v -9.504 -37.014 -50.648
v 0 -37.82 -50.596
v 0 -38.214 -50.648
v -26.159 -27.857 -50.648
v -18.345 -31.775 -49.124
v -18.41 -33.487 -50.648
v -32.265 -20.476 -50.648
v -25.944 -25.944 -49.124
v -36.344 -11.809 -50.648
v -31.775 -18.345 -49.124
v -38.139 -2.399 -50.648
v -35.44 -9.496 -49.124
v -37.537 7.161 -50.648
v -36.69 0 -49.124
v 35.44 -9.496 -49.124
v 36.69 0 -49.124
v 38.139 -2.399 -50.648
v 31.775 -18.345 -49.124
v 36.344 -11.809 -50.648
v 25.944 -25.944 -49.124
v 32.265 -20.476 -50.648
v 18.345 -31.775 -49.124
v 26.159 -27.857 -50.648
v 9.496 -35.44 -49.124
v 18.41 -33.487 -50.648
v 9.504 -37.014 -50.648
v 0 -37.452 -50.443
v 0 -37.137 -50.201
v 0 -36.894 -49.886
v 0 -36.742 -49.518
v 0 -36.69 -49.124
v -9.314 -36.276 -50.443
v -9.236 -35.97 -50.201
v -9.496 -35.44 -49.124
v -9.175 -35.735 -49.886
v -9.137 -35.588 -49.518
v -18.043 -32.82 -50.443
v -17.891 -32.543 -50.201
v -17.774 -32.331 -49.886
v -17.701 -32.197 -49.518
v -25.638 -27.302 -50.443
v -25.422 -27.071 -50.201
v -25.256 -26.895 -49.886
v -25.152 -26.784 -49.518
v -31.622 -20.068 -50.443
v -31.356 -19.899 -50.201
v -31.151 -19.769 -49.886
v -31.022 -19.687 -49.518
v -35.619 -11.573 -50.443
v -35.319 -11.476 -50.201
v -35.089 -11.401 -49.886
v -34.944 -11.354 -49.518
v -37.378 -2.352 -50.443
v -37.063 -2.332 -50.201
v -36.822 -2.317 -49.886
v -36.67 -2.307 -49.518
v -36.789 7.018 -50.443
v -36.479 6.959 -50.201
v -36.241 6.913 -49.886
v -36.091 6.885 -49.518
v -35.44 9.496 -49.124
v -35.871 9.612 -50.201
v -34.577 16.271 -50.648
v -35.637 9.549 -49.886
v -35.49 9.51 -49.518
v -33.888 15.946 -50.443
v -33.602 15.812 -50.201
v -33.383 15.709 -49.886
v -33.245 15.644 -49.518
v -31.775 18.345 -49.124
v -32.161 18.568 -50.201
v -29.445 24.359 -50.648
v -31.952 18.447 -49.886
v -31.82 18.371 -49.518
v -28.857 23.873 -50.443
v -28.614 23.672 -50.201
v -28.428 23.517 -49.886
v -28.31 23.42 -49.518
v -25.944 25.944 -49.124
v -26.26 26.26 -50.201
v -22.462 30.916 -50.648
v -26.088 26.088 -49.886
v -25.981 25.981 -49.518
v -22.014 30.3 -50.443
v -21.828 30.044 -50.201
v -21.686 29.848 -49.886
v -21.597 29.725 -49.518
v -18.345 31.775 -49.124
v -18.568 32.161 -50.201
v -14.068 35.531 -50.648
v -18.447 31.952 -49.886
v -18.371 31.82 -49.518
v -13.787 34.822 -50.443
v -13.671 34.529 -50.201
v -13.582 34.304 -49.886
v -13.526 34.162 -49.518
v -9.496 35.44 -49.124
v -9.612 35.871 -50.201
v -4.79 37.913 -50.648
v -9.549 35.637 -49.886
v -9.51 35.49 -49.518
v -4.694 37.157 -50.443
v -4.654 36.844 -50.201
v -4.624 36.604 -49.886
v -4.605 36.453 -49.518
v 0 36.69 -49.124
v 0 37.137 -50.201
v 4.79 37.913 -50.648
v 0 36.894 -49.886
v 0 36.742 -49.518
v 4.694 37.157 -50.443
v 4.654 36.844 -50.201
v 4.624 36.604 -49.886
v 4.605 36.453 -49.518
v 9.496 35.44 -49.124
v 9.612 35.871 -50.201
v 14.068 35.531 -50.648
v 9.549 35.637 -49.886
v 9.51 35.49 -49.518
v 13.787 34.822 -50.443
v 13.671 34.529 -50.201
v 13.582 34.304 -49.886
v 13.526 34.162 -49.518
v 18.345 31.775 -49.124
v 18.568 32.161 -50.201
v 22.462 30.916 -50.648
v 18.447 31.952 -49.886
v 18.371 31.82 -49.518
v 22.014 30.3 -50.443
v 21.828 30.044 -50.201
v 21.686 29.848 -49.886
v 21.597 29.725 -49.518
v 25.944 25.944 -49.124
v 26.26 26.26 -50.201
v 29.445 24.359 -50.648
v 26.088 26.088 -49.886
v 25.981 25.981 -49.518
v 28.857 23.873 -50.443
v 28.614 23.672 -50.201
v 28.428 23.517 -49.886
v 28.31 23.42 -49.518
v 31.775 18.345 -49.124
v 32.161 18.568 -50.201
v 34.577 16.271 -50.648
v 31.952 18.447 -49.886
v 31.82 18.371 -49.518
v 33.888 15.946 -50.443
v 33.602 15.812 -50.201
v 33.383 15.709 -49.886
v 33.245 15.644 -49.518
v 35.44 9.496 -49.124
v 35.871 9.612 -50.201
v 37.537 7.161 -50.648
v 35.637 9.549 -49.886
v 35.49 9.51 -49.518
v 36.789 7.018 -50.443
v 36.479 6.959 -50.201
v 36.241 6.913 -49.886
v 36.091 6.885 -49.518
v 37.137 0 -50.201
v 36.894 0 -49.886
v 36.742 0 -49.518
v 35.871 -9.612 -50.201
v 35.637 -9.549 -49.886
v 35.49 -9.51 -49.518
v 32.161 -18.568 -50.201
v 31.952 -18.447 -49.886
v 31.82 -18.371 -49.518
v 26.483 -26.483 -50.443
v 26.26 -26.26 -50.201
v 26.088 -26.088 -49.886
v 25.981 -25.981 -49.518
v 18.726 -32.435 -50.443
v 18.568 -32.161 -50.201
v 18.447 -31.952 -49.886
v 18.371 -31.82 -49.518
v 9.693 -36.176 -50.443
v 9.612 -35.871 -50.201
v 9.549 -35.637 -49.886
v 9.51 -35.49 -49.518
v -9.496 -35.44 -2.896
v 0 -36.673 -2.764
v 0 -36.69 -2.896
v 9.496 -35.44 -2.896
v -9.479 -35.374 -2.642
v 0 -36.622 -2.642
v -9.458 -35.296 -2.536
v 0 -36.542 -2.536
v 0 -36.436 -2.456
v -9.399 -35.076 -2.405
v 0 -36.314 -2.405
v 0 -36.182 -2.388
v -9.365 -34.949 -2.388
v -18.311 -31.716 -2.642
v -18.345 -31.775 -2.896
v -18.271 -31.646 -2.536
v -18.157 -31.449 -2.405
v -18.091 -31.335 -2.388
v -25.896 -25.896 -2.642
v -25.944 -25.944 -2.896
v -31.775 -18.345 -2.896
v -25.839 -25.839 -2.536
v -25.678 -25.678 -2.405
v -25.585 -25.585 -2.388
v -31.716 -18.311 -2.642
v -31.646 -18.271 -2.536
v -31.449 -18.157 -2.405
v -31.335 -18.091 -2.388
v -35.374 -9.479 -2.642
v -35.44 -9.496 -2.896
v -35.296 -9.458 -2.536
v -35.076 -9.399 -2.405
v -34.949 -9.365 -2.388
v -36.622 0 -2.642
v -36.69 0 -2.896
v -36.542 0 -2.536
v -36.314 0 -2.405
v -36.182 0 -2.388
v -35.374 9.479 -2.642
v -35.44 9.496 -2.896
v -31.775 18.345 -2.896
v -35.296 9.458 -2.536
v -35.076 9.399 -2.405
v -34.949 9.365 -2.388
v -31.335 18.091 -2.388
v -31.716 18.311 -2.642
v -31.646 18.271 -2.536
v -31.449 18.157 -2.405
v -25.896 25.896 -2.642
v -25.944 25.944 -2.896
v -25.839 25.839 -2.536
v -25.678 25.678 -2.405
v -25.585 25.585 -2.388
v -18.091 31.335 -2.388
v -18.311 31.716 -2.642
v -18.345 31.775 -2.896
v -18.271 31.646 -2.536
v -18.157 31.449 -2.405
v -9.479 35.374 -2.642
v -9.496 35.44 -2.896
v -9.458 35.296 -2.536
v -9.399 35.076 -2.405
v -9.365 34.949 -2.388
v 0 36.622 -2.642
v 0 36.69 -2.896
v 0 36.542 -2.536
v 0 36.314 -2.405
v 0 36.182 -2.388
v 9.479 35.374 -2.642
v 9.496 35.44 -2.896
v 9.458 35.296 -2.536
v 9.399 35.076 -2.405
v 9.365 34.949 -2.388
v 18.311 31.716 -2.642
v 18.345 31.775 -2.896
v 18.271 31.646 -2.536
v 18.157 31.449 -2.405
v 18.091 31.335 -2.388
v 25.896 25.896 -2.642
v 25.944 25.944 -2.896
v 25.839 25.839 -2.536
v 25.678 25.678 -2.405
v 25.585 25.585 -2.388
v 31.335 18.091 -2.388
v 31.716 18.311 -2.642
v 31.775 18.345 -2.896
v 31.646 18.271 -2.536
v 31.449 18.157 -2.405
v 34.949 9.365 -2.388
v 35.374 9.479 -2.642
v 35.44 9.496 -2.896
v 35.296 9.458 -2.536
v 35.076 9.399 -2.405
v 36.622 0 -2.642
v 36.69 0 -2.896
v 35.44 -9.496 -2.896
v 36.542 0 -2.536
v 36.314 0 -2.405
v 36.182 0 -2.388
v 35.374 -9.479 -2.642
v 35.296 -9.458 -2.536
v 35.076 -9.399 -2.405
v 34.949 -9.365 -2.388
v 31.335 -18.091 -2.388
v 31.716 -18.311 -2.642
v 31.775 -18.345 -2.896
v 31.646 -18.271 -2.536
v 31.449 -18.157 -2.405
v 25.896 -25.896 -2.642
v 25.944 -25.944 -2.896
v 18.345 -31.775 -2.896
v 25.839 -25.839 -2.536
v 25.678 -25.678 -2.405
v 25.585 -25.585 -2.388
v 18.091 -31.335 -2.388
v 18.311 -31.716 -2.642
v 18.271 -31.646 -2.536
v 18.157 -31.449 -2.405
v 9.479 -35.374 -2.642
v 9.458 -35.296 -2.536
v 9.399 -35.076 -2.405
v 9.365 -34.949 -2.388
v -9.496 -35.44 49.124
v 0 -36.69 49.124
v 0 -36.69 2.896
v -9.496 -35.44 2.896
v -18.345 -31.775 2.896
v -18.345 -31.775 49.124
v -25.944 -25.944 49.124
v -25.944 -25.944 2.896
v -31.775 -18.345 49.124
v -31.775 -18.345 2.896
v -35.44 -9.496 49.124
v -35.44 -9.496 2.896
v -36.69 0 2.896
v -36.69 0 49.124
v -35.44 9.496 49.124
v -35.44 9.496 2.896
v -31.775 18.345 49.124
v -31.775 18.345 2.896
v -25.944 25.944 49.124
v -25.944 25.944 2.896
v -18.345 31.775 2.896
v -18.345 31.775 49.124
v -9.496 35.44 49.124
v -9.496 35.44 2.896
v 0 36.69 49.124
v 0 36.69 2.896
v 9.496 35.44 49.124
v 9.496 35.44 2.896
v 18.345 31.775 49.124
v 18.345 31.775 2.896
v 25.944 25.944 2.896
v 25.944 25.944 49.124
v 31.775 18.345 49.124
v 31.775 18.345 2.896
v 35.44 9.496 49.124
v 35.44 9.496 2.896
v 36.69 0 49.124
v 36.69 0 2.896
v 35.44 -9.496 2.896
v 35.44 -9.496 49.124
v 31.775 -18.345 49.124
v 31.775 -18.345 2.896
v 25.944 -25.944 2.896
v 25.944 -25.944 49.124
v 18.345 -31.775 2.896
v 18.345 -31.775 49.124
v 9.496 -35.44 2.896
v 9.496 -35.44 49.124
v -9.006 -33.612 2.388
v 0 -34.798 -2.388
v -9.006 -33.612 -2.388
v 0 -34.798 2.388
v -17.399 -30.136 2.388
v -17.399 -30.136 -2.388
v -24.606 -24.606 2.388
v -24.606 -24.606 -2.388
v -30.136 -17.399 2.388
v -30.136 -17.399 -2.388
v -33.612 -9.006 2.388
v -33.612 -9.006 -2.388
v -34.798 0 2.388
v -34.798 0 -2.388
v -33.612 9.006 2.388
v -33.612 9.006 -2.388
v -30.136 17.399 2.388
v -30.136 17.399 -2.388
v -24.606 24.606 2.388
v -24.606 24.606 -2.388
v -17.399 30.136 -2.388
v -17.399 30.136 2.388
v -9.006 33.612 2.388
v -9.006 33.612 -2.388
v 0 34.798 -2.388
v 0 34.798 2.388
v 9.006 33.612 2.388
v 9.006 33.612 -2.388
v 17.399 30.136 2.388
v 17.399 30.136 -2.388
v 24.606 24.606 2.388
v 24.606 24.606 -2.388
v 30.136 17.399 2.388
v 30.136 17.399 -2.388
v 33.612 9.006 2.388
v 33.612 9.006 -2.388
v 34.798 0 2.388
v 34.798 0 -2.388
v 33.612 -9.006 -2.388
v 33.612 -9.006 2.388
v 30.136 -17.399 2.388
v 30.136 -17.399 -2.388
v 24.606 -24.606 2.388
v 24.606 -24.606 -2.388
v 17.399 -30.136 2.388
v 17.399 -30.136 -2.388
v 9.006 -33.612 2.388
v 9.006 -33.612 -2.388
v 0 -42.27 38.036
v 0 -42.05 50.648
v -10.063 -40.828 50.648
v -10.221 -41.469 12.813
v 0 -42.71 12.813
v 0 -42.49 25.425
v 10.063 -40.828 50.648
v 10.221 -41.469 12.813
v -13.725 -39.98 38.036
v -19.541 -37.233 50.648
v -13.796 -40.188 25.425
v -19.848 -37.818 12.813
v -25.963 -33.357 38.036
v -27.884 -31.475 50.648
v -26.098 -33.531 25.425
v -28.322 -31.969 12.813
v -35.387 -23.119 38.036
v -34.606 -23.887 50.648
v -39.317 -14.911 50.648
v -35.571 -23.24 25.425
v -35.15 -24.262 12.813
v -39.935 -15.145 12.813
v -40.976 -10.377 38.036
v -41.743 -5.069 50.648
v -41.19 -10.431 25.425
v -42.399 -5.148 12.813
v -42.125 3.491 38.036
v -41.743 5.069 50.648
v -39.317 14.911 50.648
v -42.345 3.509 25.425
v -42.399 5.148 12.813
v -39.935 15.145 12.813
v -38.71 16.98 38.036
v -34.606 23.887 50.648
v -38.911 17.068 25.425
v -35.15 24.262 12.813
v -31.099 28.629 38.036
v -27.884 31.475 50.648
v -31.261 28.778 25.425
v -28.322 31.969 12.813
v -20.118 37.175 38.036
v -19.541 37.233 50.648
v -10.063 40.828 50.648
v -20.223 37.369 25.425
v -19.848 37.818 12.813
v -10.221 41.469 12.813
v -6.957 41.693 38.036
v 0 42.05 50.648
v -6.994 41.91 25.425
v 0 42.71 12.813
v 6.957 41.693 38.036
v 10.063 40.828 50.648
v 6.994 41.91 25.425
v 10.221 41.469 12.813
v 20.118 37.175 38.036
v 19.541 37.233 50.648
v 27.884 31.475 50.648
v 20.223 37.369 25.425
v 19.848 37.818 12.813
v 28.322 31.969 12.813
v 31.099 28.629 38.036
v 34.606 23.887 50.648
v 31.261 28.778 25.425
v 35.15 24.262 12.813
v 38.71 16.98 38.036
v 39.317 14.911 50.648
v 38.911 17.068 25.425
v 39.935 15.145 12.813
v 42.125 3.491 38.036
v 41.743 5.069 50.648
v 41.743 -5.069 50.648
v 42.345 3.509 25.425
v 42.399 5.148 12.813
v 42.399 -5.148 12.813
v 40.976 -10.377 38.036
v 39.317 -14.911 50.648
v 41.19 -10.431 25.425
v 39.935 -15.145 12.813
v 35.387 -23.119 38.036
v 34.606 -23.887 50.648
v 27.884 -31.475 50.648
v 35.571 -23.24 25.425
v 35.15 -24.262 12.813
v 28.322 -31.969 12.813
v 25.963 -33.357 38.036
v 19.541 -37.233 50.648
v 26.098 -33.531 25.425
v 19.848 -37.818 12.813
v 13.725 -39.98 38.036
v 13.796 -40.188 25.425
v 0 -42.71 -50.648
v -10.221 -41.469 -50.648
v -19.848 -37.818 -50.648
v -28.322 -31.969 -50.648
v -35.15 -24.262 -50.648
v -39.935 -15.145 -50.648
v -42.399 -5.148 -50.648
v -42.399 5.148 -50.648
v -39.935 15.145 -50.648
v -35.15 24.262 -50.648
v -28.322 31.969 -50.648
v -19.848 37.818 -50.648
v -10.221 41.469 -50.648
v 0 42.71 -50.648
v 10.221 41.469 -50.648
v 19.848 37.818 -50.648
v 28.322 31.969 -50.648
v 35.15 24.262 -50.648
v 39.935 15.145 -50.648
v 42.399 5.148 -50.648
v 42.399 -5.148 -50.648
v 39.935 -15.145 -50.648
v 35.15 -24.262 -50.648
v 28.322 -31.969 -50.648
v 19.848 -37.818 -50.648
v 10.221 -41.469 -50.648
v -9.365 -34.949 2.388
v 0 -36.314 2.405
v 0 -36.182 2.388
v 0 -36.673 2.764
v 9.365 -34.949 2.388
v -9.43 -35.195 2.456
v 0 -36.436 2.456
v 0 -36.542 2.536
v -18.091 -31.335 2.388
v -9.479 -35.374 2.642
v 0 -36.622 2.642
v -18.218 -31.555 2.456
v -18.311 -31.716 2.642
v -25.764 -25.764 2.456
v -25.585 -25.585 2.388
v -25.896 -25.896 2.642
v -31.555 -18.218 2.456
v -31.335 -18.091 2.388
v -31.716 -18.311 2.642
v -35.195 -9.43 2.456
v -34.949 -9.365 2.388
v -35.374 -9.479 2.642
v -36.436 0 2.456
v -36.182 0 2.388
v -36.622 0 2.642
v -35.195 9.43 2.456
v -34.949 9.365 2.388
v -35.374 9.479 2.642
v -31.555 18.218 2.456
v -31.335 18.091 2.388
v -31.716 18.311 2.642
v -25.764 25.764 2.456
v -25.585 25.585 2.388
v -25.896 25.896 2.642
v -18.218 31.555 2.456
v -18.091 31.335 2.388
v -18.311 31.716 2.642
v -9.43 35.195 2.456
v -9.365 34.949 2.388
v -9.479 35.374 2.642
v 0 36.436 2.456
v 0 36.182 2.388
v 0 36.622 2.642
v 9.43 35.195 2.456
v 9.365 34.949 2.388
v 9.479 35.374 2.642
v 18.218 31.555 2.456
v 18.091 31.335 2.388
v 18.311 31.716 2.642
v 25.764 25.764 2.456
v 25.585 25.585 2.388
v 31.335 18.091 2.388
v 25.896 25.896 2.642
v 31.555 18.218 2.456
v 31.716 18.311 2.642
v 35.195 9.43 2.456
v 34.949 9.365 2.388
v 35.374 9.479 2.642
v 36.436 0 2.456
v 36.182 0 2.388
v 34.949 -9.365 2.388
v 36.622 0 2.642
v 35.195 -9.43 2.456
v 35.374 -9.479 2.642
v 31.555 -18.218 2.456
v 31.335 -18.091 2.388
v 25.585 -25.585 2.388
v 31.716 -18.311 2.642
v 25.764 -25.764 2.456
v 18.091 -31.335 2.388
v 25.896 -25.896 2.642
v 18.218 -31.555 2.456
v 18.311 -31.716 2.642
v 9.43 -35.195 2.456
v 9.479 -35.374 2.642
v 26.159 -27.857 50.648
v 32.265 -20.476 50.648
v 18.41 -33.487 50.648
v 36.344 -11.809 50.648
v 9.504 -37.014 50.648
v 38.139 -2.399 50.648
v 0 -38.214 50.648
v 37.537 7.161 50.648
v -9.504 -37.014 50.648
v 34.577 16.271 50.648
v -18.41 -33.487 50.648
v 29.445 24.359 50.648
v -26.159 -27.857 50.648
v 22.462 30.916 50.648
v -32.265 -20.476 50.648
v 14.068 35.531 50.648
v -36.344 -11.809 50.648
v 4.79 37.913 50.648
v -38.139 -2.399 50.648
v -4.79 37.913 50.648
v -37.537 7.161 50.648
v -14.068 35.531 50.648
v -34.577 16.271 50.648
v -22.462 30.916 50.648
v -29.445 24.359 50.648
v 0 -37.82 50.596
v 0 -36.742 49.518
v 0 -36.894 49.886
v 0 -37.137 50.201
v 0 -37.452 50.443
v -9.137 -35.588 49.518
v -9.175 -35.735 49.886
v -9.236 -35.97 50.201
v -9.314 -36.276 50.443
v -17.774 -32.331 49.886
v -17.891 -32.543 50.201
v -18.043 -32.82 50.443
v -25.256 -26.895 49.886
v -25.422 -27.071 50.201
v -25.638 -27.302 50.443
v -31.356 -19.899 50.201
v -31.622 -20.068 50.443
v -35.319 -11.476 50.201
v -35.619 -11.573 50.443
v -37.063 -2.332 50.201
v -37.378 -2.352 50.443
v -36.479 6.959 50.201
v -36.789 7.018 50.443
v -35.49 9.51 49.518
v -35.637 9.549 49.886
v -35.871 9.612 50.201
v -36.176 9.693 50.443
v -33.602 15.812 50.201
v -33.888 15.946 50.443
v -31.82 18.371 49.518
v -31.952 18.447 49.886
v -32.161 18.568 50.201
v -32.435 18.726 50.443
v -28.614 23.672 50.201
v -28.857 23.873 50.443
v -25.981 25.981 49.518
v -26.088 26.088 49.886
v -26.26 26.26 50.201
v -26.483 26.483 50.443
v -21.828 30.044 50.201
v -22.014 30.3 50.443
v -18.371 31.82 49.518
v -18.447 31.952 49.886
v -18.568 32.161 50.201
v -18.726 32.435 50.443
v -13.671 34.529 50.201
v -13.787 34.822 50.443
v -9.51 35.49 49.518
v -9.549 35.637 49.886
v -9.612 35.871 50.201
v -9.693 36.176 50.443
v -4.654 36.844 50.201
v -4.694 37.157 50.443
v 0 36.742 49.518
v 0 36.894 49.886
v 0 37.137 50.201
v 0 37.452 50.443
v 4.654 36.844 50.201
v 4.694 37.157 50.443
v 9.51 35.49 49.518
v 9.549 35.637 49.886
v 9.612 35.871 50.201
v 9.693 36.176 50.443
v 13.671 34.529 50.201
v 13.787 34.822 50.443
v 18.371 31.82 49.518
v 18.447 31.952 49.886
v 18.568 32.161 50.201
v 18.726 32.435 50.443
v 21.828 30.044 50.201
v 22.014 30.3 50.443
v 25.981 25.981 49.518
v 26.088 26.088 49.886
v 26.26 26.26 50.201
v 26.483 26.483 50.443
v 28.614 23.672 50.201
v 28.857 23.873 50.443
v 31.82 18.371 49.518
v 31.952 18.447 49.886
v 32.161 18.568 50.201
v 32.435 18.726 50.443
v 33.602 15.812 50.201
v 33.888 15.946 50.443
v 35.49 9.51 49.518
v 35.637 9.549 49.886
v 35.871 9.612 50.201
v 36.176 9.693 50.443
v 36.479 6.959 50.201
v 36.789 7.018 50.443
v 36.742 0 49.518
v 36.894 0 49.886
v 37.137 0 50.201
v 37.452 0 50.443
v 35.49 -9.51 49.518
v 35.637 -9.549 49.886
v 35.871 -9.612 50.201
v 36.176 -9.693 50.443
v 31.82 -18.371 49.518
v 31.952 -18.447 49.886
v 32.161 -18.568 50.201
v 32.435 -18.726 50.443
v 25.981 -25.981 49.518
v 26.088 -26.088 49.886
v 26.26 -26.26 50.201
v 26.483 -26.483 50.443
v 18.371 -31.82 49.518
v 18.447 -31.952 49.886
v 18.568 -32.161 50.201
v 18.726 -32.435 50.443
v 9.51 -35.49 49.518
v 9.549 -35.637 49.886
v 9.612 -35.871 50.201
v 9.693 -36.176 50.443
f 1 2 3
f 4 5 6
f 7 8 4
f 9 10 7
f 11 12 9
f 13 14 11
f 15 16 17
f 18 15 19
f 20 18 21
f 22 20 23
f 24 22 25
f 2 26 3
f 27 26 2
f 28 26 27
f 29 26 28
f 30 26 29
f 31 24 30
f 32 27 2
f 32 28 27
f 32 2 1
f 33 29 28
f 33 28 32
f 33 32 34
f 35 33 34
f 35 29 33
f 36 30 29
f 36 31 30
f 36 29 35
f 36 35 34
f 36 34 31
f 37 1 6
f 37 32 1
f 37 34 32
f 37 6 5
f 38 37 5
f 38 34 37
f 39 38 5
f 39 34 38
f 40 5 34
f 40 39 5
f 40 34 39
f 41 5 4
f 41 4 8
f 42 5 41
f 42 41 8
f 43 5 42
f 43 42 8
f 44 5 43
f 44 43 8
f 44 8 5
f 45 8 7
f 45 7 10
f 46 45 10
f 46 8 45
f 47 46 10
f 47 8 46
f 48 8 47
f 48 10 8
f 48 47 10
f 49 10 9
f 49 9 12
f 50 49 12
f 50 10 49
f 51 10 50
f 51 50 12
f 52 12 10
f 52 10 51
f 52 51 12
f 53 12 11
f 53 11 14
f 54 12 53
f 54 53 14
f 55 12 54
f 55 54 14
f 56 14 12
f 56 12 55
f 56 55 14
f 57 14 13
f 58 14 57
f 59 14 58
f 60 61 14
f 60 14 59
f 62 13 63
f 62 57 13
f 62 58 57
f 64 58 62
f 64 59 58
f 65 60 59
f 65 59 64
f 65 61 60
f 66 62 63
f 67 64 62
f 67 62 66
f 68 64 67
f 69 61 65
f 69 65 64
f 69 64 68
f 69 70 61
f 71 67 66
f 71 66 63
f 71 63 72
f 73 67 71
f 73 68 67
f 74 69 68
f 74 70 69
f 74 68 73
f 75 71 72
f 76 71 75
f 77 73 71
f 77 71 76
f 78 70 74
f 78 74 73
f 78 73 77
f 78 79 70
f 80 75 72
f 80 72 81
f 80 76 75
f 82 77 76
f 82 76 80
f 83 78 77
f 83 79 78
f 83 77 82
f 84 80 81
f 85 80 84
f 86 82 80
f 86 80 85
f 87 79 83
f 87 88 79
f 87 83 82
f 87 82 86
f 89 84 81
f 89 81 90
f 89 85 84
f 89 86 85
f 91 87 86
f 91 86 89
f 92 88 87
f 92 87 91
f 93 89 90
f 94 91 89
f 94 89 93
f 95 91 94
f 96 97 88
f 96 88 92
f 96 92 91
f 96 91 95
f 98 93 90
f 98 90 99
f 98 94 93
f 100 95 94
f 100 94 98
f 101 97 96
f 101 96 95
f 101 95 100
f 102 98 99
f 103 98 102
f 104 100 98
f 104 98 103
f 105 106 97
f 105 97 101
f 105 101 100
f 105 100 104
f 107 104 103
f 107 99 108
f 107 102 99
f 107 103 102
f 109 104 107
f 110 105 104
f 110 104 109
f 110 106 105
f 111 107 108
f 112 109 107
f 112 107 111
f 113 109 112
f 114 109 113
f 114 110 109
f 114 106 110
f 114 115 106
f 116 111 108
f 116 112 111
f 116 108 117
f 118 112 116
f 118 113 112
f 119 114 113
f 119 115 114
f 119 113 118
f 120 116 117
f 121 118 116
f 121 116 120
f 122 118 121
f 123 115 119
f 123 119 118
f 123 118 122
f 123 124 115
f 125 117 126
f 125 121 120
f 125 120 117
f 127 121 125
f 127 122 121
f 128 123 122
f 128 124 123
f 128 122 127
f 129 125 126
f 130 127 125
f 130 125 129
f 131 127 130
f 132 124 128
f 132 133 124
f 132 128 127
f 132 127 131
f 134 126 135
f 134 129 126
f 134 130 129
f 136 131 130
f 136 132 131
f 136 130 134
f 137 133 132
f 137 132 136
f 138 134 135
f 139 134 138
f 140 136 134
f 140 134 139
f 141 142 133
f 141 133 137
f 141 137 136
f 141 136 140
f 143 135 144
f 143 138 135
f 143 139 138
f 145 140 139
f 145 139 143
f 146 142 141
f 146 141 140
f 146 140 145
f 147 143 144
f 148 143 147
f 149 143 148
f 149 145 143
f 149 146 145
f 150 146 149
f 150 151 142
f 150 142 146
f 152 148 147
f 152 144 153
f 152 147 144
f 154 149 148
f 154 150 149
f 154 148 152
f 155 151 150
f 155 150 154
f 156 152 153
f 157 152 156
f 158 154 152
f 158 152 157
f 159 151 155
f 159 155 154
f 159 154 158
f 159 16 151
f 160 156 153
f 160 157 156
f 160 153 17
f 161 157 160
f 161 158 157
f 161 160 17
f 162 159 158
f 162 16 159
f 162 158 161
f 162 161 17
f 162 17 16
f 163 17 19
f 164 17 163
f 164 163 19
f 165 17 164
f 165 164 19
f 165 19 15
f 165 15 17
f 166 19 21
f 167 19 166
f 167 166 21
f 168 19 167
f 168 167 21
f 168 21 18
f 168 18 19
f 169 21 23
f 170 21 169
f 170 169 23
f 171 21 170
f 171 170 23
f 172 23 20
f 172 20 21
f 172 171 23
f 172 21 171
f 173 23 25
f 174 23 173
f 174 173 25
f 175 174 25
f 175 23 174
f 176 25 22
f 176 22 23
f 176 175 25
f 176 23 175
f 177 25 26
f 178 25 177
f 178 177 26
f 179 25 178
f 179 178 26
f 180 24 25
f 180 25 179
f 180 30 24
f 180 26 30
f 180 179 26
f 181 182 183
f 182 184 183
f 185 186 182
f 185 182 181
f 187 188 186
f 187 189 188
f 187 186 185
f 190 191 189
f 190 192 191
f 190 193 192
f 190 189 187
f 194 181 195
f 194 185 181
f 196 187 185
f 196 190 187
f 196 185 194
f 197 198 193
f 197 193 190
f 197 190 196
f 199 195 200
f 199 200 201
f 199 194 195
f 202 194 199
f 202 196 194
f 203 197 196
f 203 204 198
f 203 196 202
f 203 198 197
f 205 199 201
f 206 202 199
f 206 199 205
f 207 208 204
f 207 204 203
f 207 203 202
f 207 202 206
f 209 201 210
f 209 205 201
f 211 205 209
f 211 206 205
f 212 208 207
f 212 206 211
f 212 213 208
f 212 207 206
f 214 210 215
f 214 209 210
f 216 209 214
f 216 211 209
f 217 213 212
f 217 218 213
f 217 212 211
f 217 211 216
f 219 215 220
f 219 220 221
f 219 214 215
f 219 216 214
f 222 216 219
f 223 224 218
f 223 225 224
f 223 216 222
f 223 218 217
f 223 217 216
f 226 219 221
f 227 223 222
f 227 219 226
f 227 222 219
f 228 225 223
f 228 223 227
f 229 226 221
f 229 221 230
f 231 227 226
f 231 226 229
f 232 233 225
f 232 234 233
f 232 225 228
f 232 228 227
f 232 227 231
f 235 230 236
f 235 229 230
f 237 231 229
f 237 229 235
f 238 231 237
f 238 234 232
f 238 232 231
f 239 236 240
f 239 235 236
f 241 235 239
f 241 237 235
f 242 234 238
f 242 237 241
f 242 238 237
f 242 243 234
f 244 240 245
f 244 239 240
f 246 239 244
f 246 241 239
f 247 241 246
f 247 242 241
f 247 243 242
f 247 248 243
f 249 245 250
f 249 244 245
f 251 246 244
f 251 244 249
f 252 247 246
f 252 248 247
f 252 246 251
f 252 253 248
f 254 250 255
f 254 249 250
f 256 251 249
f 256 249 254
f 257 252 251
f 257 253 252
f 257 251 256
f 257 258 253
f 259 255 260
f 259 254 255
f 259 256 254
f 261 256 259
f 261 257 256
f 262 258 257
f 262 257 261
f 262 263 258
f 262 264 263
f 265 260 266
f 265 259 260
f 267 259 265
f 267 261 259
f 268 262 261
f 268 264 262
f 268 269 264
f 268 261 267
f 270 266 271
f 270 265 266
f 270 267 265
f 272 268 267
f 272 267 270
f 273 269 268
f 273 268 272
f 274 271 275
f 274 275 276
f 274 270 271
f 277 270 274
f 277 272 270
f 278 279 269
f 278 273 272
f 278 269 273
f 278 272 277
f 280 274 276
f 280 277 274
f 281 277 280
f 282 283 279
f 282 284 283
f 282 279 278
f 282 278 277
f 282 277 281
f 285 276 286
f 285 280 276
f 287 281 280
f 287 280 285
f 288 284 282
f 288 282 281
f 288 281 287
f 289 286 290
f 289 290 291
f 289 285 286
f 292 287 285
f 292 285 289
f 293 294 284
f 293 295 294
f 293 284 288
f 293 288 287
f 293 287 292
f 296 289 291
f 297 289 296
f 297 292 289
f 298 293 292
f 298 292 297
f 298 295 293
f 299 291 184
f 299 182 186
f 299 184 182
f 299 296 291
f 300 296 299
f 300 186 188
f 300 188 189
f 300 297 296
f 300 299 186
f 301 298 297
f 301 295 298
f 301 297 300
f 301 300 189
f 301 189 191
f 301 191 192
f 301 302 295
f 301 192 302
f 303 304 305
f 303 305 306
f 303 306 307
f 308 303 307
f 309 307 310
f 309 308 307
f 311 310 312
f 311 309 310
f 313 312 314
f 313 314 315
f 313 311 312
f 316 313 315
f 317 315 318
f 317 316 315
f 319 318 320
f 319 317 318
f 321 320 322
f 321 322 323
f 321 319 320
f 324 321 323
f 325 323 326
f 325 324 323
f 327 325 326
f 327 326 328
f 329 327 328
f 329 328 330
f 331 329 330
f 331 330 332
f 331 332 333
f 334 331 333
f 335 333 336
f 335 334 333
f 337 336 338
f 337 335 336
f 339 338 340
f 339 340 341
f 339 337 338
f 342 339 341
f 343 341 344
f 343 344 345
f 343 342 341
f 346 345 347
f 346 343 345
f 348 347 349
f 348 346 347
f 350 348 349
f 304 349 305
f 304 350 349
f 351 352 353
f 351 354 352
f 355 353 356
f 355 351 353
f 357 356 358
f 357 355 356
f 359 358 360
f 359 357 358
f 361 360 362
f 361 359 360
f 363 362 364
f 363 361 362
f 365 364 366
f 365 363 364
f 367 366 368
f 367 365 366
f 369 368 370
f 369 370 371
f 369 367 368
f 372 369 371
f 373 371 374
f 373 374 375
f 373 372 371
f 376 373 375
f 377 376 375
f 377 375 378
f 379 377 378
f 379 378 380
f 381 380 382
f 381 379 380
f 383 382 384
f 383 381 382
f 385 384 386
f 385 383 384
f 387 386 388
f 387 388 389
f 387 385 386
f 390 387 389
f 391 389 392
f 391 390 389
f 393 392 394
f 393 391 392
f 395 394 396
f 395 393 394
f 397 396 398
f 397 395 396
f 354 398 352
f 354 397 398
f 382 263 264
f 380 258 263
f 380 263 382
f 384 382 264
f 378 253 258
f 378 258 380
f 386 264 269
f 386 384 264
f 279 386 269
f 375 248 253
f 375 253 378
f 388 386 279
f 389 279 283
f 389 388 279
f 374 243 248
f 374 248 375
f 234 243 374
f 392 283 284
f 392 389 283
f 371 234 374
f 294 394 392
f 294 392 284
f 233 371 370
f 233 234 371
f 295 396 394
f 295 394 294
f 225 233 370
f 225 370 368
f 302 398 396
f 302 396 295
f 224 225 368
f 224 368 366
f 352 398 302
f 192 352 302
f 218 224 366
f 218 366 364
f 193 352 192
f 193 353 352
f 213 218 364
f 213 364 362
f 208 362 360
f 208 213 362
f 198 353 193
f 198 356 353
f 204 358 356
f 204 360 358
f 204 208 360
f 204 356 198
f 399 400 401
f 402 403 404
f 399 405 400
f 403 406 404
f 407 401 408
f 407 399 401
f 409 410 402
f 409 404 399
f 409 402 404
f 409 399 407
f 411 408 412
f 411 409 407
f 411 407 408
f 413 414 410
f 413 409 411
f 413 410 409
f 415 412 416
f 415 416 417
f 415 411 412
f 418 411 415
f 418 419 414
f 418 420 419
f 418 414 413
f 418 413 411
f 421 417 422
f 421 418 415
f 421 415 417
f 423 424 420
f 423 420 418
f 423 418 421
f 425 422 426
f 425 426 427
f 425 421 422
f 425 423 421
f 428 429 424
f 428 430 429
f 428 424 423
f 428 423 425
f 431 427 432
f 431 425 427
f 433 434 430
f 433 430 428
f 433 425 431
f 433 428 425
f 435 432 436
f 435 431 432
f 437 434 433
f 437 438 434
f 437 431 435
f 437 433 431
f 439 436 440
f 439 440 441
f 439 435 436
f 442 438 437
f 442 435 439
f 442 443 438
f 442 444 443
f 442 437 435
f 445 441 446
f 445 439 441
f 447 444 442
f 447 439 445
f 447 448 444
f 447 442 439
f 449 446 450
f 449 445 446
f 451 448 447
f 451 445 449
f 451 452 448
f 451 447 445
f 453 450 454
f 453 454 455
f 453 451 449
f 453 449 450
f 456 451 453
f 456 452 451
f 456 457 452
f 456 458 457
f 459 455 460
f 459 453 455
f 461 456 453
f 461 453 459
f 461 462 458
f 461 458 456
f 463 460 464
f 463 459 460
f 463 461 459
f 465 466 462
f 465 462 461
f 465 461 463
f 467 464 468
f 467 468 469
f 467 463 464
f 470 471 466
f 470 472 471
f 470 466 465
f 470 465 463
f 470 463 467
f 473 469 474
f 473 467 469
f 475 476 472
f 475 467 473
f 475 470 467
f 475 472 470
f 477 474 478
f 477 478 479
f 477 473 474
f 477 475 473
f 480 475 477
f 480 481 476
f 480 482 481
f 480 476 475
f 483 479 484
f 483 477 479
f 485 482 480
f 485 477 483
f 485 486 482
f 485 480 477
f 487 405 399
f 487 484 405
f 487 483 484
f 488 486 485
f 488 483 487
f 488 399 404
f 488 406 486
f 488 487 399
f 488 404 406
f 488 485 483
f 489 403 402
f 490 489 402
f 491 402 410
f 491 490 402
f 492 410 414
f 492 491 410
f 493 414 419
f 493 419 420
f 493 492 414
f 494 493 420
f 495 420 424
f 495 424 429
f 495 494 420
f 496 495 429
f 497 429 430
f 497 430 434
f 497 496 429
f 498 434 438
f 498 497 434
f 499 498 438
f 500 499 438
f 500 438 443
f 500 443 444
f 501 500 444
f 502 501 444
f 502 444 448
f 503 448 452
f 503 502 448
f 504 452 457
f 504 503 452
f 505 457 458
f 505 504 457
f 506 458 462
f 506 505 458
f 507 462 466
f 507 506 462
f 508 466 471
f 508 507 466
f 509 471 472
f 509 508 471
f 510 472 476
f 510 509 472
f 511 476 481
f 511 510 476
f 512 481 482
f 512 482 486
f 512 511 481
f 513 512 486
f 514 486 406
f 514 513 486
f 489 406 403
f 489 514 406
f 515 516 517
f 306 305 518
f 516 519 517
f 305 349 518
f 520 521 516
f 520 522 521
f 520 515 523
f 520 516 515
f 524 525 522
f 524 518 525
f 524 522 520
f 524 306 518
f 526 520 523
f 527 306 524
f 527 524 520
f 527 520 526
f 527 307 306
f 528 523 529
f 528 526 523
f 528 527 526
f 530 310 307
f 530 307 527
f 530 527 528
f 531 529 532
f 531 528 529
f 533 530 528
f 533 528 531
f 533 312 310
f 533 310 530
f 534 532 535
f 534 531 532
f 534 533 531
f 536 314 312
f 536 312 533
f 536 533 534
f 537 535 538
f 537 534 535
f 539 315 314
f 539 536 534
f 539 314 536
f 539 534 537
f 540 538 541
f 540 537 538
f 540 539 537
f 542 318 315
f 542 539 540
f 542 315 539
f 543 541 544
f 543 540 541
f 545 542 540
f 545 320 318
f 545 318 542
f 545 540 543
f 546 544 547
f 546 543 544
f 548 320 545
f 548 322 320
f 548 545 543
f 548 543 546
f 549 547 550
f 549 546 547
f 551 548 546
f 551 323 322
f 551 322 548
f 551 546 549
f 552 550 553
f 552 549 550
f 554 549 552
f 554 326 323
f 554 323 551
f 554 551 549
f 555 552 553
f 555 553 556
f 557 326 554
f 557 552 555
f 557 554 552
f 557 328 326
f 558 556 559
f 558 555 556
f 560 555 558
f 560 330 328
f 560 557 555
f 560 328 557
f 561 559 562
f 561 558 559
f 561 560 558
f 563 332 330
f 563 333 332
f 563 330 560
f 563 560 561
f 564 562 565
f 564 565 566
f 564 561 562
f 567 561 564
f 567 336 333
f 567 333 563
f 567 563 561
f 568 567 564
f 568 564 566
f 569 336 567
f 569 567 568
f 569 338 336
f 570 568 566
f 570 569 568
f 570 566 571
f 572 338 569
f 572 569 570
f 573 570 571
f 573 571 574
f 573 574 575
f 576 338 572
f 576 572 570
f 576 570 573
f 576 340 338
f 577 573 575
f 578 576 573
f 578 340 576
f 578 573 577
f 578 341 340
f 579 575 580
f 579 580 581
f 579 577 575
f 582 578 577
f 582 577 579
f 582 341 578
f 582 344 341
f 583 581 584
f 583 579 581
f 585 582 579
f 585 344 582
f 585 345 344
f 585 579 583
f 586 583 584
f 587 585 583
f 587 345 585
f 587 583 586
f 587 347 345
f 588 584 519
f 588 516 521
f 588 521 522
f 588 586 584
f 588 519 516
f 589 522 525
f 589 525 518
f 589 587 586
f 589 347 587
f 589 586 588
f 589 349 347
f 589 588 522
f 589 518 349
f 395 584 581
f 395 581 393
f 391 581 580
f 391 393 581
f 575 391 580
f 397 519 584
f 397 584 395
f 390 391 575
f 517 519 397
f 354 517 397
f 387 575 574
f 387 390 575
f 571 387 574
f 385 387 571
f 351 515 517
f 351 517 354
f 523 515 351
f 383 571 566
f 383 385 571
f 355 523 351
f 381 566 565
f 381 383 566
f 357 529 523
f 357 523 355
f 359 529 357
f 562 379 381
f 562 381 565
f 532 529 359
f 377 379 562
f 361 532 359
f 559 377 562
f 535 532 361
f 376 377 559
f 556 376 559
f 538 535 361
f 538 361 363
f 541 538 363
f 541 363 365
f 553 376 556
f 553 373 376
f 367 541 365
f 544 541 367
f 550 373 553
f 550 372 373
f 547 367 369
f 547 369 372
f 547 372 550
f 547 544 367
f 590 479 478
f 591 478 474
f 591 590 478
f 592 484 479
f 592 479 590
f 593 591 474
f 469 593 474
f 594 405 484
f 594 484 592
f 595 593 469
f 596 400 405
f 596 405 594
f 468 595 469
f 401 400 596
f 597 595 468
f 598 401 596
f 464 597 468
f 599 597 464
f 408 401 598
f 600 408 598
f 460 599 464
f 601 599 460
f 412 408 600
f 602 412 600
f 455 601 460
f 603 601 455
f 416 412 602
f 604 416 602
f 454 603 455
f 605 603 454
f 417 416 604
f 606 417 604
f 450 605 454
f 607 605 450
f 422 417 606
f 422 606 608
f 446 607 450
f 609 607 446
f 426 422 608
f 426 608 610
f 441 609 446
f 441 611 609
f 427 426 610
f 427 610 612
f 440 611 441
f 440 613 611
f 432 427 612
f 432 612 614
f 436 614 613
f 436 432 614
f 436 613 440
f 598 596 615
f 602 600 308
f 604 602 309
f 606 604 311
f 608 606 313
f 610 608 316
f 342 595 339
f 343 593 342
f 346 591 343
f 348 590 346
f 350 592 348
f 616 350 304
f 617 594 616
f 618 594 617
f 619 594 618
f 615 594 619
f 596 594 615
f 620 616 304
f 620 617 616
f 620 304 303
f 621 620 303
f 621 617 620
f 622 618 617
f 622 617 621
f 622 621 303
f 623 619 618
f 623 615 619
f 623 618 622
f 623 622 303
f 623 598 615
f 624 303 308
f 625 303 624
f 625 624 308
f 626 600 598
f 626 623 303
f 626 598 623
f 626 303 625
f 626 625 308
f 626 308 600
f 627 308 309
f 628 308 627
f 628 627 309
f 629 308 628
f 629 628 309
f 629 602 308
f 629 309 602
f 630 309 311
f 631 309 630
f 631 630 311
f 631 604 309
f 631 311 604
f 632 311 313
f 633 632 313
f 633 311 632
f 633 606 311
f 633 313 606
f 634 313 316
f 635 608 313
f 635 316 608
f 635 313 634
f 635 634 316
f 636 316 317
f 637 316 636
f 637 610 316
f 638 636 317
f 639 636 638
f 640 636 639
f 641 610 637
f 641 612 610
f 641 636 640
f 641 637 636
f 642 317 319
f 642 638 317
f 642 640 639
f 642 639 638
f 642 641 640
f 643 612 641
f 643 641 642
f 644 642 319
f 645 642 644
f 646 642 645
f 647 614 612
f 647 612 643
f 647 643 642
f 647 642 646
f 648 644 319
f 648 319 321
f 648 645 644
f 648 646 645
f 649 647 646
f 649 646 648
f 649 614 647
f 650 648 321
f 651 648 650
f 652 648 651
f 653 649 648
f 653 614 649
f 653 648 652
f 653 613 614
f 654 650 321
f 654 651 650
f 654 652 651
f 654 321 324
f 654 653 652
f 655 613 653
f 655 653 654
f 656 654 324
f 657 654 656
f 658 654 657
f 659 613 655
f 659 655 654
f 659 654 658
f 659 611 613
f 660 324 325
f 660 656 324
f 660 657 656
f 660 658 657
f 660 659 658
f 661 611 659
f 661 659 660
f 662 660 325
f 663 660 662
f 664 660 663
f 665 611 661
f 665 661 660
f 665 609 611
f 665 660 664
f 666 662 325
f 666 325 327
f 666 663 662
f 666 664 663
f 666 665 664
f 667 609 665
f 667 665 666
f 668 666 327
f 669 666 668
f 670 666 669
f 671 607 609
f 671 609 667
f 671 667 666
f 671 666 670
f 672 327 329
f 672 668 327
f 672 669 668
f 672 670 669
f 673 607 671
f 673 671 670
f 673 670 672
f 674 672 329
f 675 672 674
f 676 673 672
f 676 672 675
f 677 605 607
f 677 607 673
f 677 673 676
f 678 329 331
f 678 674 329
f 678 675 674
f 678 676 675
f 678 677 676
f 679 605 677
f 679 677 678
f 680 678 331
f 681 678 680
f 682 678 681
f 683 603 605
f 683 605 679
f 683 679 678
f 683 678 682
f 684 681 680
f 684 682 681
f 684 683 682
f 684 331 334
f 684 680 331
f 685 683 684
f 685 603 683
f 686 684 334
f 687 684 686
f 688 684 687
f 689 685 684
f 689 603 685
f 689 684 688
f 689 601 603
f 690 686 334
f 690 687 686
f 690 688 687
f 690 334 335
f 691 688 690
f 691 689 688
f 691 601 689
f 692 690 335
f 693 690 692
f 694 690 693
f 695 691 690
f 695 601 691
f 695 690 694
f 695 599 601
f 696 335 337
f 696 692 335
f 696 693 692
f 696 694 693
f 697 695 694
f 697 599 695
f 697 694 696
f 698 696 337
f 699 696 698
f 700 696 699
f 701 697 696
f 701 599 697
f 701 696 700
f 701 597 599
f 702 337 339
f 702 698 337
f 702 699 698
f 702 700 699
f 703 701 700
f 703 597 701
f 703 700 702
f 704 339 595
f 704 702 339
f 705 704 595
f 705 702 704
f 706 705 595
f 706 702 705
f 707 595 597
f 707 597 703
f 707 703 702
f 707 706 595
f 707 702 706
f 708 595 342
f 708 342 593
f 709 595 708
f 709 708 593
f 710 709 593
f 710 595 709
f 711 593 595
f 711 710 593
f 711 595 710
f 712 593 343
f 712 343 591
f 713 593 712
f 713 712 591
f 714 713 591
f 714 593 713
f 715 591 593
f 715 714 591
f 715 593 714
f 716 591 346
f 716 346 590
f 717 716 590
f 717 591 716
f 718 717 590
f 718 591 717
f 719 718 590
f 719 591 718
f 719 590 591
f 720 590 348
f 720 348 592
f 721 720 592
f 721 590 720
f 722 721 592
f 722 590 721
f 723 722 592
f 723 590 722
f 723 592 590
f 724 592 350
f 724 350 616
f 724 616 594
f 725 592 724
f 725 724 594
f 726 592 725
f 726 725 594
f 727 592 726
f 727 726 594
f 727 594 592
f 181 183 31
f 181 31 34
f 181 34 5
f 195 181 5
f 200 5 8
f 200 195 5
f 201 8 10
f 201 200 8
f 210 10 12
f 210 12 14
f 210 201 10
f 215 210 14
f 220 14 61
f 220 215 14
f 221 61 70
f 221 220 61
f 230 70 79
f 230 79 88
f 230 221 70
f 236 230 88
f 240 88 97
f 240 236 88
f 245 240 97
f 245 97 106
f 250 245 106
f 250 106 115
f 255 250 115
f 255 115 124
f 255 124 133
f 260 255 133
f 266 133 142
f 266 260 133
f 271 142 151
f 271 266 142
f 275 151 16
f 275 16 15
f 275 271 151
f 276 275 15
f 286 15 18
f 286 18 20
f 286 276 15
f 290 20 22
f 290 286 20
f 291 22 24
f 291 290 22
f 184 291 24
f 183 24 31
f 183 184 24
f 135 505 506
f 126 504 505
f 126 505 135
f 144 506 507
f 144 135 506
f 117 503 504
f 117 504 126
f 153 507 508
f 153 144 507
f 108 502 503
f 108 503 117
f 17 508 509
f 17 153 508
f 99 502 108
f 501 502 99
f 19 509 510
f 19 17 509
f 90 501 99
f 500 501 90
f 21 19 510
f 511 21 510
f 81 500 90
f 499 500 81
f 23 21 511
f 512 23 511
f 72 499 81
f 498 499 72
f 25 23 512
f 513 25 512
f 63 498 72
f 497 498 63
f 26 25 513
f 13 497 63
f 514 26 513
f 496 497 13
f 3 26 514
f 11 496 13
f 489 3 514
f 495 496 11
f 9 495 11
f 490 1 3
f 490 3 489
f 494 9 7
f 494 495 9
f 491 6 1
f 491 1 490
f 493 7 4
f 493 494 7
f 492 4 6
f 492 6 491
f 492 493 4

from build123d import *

# Parameters (mm, degrees)
FILLET1_R = 1.524
FILLET2_R = 0.508


with BuildPart() as part:
    # Sketch3 → Revolve1 (revolve)
    with BuildSketch(Plane(origin=(0, 0, 0), x_dir=(0, 0, -1), z_dir=(1, 0, 0))):
        Polygon((-12.813309339, -42.7101), (50.6476, -42.7101), (50.6476, -36.6903), (2.3876, -36.6903), (2.3876, -34.798), (-2.3876, -34.798), (-2.3876, -36.6903), (-50.6476, -36.6903), (-50.6476, -42.0497), align=None)
    revolve(axis=Axis((0, 0, 50.6476), (0, 0, -1)))

    # Fillet1
    fillet1_edges = [part.edges().sort_by_distance(p)[0] for p in [
        (0, 36.6903, -50.6476),
        (0, 36.6903, 50.6476),
    ]]
    fillet(fillet1_edges, radius=FILLET1_R)

    # Fillet2
    fillet2_edges = [part.edges().sort_by_distance(p)[0] for p in [
        (0, 36.6903, 2.3876),
        (0, 36.6903, -2.3876),
    ]]
    fillet(fillet2_edges, radius=FILLET2_R)


solid = part.part
